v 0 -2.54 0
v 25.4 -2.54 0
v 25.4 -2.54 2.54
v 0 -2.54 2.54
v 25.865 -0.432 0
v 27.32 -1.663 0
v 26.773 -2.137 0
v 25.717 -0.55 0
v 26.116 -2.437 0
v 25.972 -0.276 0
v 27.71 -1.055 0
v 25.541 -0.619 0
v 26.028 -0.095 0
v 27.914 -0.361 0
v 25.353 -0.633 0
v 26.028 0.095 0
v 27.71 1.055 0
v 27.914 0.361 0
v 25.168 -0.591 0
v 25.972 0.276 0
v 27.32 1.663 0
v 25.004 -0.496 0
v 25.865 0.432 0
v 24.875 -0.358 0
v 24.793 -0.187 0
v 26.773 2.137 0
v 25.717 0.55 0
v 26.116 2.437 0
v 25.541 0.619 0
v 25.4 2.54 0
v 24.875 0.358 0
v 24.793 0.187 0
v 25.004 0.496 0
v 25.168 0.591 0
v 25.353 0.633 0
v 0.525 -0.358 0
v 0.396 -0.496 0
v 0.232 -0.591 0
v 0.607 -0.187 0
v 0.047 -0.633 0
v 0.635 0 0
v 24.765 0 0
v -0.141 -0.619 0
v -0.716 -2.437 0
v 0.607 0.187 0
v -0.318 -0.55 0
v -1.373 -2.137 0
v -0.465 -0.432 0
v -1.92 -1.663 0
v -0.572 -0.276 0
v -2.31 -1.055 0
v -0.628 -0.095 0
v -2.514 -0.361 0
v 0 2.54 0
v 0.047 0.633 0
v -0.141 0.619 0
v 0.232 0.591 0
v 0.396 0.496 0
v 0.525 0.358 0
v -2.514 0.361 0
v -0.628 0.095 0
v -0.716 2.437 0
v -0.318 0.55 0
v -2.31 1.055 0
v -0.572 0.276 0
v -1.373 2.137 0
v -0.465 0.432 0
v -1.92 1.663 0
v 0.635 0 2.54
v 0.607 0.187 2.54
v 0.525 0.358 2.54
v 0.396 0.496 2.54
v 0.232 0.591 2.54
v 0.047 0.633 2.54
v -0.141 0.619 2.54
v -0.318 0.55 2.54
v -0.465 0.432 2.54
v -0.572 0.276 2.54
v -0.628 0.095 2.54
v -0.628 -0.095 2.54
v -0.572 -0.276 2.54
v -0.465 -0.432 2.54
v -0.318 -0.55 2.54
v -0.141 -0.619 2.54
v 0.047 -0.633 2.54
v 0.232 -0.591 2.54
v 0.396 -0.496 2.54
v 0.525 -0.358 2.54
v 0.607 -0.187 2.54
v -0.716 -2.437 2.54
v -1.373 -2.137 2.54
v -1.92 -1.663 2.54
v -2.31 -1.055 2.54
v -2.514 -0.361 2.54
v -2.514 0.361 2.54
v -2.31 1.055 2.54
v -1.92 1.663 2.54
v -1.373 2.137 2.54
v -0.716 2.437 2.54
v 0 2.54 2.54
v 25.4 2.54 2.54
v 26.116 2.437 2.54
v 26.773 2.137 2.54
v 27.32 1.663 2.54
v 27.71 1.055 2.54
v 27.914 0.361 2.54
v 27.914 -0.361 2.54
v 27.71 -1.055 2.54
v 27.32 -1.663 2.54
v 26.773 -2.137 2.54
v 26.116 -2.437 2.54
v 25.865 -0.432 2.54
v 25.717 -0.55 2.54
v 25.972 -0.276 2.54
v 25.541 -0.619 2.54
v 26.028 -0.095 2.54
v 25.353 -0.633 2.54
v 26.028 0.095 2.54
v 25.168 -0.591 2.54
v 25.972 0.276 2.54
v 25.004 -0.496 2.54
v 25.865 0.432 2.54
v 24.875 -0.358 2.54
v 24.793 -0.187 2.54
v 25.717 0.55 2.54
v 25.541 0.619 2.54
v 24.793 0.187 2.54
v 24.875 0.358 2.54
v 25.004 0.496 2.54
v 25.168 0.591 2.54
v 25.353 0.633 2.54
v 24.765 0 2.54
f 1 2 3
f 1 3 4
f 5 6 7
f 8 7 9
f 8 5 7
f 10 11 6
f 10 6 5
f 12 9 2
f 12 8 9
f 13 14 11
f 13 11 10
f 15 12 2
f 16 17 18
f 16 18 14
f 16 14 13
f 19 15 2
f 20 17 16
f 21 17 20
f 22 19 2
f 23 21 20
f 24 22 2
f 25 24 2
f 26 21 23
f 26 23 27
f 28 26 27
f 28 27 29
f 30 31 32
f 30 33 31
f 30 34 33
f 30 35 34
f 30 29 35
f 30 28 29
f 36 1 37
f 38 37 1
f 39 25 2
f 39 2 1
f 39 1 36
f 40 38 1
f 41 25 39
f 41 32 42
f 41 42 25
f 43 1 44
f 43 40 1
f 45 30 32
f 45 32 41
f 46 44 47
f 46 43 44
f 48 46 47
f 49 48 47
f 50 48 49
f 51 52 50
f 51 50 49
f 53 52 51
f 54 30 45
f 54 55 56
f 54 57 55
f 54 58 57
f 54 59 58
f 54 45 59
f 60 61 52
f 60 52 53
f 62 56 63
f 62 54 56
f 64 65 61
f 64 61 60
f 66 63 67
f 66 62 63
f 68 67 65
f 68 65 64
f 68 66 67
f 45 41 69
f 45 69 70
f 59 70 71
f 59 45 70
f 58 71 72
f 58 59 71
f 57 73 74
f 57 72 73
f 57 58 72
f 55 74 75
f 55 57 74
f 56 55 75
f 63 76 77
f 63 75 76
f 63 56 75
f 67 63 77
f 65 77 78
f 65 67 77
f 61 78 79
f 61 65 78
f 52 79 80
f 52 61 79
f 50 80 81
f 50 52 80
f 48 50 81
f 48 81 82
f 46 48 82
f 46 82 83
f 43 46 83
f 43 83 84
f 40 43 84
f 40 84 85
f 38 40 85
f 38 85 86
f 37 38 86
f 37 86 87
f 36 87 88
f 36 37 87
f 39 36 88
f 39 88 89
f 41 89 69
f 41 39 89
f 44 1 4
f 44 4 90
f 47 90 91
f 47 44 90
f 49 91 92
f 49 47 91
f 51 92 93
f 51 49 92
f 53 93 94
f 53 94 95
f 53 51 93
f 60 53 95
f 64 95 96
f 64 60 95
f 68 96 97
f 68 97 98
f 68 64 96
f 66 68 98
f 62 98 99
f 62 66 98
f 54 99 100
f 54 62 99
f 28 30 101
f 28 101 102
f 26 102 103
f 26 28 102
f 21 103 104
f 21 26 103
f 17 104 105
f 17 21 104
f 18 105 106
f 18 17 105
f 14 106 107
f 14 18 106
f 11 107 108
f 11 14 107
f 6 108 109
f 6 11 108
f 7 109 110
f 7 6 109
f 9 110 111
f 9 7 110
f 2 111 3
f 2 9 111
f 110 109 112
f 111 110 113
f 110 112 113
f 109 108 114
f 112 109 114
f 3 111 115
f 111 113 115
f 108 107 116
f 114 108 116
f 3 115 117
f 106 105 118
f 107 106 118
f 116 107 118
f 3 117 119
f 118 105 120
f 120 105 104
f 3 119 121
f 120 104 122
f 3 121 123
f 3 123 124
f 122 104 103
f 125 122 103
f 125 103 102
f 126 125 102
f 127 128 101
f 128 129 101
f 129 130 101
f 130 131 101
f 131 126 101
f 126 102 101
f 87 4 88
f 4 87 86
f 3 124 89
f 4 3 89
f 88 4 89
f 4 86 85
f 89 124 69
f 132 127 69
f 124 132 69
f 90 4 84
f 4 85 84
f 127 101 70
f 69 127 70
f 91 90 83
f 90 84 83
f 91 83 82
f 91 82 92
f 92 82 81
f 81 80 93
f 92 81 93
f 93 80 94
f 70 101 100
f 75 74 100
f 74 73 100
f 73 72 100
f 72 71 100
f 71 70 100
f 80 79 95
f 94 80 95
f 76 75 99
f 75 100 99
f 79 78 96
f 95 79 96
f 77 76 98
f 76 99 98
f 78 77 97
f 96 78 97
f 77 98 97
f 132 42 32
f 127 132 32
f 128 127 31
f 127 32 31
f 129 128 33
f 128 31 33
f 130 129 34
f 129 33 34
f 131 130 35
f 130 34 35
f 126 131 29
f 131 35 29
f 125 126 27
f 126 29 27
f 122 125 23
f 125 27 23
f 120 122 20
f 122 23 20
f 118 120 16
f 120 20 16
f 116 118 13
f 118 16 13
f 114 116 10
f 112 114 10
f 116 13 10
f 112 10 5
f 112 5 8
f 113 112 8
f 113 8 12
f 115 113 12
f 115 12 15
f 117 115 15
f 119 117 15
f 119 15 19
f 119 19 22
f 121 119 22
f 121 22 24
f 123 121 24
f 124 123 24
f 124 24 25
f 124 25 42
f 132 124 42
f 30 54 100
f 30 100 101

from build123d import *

# Parameters (mm, degrees)
BOSS_EXTRUDE1_DEPTH = 2.54
CUT_EXTRUDE1_START  = -3.54
SKETCH2_R           = 0.635
CUT_EXTRUDE1_DEPTH  = 4.54


with BuildPart() as part:
    # Sketch1 → Boss-Extrude1 (new body)
    with BuildSketch(Plane.XY):
        with BuildLine():
            Line((0, 2.54), (25.4, 2.54))
            ThreePointArc((25.4, 2.54), (27.94, 0), (25.4, -2.54))
            Line((25.4, -2.54), (0, -2.54))
            ThreePointArc((0, -2.54), (-2.54, 0), (0, 2.54))
        make_face()
    extrude(amount=BOSS_EXTRUDE1_DEPTH)

    # Sketch2 → Cut-Extrude1 (cut)
    with BuildSketch(Plane.XY.offset(2.54).offset(CUT_EXTRUDE1_START)):
        Circle(SKETCH2_R)
    cut_extrude1 = extrude(amount=CUT_EXTRUDE1_DEPTH, mode=Mode.SUBTRACT)

    # Mirror1: Cut-Extrude1 across plane
    add(cut_extrude1.mirror(Plane(origin=(12.7, 0, 0), x_dir=(0, 0, 1), z_dir=(1, 0, 0))), mode=Mode.SUBTRACT)


solid = part.part
